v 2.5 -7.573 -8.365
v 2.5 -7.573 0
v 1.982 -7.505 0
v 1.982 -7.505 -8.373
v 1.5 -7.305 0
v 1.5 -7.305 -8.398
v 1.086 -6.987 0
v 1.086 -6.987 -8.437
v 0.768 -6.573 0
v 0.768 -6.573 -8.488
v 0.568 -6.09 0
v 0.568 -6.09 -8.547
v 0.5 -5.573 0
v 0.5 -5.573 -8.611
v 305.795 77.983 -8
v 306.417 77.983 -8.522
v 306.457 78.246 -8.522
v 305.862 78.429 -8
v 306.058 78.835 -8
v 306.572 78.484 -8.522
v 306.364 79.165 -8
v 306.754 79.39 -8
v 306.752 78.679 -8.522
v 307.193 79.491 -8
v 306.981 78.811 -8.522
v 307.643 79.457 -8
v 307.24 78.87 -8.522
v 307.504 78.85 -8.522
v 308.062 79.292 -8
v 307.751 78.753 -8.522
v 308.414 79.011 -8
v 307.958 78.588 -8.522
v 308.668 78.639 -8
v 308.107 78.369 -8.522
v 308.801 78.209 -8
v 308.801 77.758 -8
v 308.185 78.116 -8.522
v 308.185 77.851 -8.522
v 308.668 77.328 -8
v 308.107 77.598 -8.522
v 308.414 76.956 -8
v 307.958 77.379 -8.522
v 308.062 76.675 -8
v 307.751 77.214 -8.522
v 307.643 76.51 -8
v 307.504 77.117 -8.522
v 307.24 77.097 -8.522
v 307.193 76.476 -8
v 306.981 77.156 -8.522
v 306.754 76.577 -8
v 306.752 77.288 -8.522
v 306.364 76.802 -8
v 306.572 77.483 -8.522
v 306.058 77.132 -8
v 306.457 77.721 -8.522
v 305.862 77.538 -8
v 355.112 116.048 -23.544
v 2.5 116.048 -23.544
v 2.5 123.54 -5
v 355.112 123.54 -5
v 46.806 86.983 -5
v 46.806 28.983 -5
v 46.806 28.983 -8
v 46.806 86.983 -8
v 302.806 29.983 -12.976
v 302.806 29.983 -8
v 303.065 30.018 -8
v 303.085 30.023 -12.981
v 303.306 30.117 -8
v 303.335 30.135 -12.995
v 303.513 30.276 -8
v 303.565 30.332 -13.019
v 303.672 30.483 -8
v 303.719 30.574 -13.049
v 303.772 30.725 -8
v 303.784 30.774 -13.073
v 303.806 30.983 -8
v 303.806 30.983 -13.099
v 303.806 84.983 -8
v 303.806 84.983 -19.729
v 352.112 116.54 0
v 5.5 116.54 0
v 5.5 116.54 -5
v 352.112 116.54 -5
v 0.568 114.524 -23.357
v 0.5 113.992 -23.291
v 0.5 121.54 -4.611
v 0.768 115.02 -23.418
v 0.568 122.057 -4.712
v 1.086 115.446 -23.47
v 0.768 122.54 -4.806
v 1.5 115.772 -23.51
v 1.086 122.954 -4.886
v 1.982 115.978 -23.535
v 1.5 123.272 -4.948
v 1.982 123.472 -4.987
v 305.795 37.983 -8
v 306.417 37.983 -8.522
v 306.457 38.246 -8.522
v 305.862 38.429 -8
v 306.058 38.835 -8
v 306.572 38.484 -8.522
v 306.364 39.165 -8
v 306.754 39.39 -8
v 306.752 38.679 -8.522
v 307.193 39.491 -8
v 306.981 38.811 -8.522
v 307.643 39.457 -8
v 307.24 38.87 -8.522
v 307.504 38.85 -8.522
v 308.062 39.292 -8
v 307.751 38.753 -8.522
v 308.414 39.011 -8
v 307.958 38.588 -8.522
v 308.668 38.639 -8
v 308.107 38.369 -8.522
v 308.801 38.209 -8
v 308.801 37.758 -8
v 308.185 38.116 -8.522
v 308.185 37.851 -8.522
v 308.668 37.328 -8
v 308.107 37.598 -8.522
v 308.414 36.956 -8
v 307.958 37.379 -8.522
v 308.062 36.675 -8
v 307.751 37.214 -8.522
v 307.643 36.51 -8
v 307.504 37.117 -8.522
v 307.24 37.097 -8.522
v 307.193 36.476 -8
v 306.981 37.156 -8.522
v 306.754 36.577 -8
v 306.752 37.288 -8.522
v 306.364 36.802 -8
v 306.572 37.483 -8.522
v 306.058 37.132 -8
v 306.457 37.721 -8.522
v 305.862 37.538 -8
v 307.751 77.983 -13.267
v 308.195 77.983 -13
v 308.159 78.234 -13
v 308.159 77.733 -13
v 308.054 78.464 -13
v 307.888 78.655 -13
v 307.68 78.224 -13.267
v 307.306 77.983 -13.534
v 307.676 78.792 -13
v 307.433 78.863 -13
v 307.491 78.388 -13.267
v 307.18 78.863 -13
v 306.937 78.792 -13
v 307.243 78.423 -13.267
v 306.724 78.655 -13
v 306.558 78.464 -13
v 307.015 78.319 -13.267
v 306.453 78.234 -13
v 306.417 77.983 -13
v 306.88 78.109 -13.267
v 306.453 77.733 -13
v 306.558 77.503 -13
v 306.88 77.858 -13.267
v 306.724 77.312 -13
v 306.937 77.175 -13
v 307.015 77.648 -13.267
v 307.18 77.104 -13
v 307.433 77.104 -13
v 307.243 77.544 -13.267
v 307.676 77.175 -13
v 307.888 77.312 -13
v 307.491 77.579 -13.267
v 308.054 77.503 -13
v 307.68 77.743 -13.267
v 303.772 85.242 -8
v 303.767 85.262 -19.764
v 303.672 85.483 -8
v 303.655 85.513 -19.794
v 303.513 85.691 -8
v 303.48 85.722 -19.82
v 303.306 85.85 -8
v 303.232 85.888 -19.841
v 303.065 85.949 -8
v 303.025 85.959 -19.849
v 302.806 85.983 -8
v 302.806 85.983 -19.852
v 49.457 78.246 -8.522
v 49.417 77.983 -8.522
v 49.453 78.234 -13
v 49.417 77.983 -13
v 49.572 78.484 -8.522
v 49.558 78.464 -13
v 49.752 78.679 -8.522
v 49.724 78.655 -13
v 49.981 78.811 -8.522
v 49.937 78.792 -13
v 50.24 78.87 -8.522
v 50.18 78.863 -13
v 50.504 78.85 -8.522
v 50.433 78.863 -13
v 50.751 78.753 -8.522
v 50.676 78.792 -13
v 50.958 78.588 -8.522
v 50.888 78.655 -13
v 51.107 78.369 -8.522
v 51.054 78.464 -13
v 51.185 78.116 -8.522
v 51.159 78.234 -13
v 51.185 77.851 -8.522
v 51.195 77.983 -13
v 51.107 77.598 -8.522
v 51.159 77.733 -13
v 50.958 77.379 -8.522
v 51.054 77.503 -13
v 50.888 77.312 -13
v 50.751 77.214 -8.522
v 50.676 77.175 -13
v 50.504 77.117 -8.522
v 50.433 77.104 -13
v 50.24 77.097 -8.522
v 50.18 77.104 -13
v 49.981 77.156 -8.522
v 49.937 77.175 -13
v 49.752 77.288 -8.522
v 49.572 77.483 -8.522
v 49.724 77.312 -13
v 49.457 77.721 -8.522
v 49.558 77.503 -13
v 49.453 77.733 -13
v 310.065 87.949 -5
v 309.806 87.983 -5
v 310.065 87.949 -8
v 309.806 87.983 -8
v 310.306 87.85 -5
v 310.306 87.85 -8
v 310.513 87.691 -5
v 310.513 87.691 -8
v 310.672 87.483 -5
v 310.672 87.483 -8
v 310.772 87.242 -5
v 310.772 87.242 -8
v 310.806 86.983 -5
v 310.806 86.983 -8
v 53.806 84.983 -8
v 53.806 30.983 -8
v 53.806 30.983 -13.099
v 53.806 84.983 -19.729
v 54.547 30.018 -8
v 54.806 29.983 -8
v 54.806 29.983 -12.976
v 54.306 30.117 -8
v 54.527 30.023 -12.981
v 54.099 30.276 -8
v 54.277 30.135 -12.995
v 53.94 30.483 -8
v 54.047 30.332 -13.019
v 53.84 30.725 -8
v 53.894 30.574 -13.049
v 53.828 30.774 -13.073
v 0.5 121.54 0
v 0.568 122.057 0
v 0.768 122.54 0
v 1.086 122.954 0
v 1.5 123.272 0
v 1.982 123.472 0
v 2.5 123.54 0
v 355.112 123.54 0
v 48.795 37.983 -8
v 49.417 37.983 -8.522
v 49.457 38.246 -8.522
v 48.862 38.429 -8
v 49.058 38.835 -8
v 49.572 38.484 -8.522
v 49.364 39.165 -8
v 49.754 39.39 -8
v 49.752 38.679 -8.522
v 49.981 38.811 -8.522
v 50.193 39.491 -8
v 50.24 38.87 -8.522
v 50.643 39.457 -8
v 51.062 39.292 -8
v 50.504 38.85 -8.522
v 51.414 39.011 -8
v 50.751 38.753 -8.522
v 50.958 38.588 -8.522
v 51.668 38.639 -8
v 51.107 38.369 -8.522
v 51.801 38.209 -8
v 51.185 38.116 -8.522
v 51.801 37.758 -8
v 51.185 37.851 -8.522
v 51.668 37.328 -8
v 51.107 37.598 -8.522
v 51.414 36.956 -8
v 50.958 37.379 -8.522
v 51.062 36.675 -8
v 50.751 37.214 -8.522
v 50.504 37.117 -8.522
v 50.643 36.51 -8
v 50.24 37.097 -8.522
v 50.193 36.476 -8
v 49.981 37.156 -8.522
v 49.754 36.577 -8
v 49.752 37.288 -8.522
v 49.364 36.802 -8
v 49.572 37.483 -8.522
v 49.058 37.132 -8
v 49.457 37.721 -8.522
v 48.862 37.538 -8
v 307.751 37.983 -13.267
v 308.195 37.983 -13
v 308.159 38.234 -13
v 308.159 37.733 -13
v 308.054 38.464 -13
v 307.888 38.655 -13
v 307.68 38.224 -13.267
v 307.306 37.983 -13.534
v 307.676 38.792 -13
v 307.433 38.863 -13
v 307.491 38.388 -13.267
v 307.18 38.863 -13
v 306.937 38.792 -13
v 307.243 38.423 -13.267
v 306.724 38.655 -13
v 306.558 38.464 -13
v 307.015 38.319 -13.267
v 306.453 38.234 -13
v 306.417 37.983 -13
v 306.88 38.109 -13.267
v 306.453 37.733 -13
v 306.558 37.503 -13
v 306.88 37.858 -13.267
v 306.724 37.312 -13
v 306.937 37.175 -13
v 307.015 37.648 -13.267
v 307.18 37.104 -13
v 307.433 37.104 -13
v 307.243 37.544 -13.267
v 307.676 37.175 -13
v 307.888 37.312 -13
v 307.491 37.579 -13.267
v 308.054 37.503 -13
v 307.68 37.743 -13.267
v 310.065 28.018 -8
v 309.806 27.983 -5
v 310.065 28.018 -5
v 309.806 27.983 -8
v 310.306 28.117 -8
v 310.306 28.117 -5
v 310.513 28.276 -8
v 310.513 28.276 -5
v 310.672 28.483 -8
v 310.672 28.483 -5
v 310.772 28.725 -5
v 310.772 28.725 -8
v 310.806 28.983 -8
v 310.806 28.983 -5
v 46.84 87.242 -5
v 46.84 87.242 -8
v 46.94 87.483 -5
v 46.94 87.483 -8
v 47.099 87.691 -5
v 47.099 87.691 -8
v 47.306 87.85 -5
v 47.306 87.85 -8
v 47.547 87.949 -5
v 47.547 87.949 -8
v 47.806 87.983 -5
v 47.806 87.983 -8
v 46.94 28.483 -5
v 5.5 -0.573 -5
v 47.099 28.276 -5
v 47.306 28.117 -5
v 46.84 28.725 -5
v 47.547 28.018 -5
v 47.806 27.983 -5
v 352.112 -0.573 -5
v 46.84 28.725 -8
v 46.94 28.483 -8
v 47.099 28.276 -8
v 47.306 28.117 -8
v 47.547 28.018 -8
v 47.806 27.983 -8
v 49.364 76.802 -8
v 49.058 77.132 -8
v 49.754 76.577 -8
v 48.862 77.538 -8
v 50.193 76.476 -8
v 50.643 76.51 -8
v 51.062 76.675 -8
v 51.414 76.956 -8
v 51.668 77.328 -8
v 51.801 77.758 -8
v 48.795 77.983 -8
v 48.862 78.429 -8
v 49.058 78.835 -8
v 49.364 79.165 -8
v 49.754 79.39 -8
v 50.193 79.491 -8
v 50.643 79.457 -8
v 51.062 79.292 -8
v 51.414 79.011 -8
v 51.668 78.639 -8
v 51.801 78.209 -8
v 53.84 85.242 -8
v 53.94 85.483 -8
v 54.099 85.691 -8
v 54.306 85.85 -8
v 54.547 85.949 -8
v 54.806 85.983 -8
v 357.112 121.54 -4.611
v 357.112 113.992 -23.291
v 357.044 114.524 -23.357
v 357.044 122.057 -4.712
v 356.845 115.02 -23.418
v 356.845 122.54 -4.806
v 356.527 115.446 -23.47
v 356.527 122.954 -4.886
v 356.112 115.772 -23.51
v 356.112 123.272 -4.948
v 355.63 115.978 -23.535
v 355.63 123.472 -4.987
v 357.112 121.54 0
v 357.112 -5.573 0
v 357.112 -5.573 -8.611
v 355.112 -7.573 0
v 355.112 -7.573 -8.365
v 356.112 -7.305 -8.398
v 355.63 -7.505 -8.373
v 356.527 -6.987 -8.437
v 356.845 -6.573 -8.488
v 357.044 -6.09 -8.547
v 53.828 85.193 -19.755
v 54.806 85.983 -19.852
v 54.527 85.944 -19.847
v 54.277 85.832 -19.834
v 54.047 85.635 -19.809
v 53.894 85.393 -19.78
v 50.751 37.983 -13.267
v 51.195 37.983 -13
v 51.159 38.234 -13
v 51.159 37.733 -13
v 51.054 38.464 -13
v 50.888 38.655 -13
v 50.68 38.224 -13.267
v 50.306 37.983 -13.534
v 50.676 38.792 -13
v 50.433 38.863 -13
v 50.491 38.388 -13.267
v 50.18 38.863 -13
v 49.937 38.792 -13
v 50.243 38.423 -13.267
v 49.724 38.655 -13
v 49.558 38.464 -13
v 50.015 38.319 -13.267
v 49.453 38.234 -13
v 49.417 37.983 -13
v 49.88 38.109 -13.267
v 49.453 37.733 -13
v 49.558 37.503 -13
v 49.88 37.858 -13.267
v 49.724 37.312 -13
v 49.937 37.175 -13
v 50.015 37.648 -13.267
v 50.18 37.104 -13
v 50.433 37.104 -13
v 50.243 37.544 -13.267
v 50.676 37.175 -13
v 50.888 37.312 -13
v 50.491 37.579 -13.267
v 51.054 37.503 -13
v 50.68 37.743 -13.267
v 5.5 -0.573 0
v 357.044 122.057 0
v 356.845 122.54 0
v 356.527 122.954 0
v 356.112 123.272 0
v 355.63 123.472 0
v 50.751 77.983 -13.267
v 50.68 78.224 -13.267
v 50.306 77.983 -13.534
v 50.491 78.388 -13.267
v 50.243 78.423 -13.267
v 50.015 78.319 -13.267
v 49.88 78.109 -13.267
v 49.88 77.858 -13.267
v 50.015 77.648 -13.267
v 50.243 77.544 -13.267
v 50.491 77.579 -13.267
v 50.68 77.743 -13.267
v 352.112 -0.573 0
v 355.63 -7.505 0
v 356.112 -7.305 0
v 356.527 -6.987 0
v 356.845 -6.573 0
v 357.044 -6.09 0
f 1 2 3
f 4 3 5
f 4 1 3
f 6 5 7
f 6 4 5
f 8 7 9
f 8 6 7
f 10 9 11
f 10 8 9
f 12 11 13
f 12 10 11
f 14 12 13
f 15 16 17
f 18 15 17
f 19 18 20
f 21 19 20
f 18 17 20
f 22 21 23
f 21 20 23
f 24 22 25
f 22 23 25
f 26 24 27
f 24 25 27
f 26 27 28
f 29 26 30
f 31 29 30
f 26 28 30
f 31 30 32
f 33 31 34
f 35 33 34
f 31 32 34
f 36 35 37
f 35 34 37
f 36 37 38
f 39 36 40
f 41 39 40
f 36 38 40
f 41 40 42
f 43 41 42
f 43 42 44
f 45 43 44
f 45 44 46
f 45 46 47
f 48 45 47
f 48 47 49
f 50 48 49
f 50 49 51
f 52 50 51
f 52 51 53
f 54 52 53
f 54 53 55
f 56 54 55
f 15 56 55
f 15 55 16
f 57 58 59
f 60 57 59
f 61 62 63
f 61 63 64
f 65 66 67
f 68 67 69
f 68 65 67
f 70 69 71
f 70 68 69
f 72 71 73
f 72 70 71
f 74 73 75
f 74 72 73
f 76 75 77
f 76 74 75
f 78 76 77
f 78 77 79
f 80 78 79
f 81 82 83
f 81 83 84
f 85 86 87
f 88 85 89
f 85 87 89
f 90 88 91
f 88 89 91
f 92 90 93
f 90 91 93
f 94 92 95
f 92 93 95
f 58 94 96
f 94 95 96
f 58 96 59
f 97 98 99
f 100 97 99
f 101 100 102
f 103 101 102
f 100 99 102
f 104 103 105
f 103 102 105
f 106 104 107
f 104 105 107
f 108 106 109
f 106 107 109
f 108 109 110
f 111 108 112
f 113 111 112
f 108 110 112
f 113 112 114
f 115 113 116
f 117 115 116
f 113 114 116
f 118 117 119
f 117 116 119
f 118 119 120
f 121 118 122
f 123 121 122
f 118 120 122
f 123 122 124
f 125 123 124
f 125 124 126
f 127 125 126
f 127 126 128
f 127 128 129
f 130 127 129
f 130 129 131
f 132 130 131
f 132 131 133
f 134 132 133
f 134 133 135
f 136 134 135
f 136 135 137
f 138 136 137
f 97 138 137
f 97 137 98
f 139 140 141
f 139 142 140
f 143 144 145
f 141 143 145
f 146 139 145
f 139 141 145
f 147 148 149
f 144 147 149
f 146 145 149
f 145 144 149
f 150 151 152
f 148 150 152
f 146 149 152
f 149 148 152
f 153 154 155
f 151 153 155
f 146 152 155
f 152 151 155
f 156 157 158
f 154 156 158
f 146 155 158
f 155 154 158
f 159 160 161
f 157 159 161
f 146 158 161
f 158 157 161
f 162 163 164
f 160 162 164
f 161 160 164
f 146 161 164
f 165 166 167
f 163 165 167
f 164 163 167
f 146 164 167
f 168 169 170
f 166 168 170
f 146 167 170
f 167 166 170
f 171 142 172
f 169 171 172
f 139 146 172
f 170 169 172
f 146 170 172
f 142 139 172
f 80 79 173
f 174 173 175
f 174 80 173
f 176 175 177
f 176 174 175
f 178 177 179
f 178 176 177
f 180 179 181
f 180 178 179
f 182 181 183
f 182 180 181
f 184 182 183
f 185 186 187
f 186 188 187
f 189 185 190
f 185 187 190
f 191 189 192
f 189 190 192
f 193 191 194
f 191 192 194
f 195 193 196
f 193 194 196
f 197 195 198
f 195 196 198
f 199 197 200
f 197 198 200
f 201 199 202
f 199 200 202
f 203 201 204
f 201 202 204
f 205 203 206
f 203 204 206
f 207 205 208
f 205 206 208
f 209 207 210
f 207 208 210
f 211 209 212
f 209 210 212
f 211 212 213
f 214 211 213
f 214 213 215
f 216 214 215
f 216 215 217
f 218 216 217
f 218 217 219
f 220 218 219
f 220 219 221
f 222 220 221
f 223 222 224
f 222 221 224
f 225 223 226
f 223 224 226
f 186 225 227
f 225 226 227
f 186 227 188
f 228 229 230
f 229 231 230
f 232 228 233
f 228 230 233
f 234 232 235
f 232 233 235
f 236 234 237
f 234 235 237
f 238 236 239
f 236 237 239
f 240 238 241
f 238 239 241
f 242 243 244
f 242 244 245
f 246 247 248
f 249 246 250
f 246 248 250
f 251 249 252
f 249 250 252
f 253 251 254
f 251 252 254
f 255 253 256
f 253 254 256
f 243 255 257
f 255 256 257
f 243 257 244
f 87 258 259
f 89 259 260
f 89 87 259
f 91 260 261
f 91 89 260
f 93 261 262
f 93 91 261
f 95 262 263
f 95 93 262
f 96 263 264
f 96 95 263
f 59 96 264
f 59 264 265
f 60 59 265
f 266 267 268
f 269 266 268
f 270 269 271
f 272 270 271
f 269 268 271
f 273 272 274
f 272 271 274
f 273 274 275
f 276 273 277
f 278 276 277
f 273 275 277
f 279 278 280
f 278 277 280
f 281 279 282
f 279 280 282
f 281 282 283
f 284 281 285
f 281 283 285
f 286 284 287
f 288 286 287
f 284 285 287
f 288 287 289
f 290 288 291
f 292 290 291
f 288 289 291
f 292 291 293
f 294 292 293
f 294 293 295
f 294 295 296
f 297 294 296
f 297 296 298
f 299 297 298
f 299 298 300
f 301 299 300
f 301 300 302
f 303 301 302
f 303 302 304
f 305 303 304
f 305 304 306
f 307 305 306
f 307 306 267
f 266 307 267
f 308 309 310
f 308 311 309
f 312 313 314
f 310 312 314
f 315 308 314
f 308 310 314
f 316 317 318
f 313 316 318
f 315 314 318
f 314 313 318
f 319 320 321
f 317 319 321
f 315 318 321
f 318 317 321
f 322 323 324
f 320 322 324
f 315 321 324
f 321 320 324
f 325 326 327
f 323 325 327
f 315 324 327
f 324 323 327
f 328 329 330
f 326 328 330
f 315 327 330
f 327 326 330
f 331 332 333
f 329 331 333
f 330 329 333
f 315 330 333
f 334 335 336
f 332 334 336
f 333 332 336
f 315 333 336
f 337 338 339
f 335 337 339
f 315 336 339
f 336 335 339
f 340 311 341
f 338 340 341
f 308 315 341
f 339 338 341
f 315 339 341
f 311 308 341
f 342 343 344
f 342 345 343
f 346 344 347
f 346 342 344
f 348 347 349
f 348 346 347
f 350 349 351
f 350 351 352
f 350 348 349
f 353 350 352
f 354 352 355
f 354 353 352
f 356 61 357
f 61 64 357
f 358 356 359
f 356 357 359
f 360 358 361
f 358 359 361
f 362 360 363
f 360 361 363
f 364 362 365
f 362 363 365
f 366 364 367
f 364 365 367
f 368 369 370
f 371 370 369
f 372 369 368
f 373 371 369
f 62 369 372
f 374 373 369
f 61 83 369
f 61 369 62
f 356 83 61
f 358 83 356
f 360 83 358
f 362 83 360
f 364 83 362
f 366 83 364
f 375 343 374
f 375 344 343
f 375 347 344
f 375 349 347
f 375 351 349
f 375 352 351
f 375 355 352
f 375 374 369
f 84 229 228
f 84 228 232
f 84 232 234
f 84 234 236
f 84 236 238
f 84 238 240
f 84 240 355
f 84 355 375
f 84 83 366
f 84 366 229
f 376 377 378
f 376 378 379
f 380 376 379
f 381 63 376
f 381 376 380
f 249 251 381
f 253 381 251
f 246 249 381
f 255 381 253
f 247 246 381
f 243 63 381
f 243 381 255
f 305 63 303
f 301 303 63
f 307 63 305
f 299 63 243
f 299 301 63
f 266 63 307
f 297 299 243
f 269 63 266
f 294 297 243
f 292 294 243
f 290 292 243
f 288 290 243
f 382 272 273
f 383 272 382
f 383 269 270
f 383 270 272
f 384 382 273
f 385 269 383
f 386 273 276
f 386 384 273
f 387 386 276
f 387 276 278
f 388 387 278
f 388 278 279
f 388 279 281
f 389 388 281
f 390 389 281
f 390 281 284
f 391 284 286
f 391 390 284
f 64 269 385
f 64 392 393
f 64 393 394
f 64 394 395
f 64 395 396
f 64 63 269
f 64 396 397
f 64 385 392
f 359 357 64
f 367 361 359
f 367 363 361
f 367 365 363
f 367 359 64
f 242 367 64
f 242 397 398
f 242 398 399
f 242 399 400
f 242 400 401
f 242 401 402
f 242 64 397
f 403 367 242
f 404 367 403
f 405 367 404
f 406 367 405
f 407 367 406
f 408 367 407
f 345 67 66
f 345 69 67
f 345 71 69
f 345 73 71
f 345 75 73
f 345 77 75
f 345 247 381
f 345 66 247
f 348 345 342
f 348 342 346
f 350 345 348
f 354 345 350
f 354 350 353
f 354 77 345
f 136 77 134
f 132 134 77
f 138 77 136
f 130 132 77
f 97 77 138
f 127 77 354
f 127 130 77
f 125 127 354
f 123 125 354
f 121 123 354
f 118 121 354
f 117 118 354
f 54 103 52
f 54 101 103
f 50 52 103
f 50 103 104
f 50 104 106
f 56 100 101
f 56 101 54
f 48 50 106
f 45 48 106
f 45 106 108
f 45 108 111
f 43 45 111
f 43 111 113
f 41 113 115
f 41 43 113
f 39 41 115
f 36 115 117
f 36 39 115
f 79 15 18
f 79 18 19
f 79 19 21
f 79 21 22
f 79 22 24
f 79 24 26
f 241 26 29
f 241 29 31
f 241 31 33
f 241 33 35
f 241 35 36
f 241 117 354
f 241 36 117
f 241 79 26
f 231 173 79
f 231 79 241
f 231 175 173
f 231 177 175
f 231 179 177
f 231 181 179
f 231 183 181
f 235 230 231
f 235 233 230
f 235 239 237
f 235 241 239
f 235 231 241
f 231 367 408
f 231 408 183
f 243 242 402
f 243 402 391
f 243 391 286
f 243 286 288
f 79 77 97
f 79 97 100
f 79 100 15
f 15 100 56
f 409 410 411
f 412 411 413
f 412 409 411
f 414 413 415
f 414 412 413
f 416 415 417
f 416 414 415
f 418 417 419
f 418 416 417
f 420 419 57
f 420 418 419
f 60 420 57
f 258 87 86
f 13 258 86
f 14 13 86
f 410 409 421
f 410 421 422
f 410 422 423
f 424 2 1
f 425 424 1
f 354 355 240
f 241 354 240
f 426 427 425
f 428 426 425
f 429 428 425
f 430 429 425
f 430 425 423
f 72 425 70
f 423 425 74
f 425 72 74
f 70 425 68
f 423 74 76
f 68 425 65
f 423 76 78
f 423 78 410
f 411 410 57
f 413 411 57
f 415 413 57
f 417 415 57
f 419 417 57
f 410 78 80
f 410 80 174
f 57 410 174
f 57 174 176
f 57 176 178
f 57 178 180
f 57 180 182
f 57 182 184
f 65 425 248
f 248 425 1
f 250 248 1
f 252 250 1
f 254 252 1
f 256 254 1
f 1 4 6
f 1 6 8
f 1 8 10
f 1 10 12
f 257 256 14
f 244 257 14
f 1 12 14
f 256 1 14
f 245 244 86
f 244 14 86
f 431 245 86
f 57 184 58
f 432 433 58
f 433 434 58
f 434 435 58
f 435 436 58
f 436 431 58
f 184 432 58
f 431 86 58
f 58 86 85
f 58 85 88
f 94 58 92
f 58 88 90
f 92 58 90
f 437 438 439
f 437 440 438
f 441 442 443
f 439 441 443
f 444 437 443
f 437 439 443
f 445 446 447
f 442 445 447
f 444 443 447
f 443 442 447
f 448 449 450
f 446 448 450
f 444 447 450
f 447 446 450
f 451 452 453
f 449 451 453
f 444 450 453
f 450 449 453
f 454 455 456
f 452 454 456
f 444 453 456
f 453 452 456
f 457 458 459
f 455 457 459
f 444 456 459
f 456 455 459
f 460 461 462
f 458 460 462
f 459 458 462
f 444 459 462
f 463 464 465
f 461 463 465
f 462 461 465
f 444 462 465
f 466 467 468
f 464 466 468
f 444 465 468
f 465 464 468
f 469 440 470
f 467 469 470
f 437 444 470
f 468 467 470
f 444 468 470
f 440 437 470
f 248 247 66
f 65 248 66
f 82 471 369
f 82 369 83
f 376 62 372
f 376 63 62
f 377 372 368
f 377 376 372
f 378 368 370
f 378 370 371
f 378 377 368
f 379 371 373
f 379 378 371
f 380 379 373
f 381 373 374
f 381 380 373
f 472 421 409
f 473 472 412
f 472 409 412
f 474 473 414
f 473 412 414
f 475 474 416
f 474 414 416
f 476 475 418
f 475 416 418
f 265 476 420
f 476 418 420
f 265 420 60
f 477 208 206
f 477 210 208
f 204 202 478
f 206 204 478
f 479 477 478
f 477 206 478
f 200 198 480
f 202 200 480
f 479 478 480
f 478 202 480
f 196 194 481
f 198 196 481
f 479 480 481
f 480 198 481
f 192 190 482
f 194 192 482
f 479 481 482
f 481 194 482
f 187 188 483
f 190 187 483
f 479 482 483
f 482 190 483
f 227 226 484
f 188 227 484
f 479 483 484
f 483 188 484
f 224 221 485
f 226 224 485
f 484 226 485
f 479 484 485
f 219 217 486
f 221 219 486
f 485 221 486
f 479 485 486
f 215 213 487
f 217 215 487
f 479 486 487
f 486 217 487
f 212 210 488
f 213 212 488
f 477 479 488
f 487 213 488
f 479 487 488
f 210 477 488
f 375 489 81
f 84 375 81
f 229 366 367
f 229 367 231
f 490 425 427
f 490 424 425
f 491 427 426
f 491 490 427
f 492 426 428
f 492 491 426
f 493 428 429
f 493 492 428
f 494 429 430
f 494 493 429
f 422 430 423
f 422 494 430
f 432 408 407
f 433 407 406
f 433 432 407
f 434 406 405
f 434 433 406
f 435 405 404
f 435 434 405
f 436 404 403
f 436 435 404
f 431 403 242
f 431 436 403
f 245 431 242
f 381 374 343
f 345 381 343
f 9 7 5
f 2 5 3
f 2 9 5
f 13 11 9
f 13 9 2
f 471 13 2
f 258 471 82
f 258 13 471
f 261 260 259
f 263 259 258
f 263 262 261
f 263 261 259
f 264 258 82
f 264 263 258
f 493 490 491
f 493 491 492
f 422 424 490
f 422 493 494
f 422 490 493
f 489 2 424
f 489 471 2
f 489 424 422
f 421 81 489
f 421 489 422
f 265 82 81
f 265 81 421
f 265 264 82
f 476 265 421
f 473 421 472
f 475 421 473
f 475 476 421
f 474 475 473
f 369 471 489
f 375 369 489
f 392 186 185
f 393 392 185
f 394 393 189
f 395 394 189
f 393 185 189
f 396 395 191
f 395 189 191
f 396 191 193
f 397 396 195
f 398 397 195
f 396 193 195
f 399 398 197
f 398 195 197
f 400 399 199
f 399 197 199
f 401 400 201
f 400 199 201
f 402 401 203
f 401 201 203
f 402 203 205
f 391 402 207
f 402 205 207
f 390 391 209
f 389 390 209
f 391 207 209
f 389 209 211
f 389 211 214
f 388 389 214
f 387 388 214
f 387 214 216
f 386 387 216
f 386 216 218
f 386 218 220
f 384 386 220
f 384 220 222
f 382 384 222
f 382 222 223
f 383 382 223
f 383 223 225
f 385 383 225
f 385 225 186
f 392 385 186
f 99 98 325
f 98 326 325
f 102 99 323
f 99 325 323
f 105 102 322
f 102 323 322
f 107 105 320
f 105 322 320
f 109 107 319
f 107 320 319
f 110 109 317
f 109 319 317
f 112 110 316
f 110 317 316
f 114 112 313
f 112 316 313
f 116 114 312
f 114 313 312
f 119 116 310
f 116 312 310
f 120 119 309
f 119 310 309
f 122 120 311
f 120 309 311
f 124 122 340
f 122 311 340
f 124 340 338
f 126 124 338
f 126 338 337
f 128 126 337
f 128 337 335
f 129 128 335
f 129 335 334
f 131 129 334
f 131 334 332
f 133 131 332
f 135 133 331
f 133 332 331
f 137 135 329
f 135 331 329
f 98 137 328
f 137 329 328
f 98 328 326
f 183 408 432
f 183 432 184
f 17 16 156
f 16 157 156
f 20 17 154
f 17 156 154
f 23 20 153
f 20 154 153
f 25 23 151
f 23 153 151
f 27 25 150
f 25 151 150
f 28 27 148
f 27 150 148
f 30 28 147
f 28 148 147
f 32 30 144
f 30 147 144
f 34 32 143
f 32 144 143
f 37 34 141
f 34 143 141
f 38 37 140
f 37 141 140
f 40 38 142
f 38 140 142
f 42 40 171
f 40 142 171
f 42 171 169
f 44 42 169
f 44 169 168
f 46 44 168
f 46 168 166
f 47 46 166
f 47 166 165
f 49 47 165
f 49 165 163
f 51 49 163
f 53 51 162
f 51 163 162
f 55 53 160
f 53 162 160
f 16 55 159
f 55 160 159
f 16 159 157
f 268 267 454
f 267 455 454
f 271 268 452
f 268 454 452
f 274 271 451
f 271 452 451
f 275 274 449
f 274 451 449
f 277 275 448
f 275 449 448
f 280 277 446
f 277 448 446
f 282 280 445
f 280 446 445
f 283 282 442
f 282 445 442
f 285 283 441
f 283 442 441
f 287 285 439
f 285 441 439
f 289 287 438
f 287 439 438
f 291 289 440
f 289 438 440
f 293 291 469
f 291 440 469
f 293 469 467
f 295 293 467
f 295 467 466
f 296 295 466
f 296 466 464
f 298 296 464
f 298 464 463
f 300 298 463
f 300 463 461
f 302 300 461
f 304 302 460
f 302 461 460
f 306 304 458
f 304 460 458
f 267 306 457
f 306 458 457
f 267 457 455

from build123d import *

# Parameters (mm, degrees)
SKETCH3_W                                         = 356.6125
SKETCH3_H                                         = 131.1125
BOSS_EXTRUDE1_DEPTH                               = 5
BOSS_EXTRUDE2_DEPTH                               = 356.6125
SKETCH5_W                                         = 346.6125
SKETCH5_H                                         = 117.1125
CUT_EXTRUDE1_DEPTH                                = 5
SKETCH6_W                                         = 264
SKETCH6_H                                         = 60
CUT_EXTRUDE2_DEPTH                                = 3
SKETCH7_W                                         = 250
SKETCH7_H                                         = 56
CUT_EXTRUDE3_DEPTH                                = 43
FILLET1_R                                         = 1
CSK_FOR_0_FLAT_HEAD_MACHINE_SCREW_100_D           = 1.778
CSK_FOR_0_FLAT_HEAD_MACHINE_SCREW_100_DEPTH       = 5
CSK_FOR_0_FLAT_HEAD_MACHINE_SCREW_100_CSINK_D     = 3.0226
CSK_FOR_0_FLAT_HEAD_MACHINE_SCREW_100_CSINK_ANGLE = 100
CSK_FOR_0_FLAT_HEAD_MACHINE_SCREW_100_TIP         = 0.53416509
CSK_FOR_0_FLAT_HEAD_MACHINE_SCREW_2_D             = 1.778
CSK_FOR_0_FLAT_HEAD_MACHINE_SCREW_2_DEPTH         = 5
CSK_FOR_0_FLAT_HEAD_MACHINE_SCREW_2_CSINK_D       = 3.0226
CSK_FOR_0_FLAT_HEAD_MACHINE_SCREW_2_CSINK_ANGLE   = 100
CSK_FOR_0_FLAT_HEAD_MACHINE_SCREW_2_TIP           = 0.53416509
FILLET2_R                                         = 2


with BuildPart() as part:
    # Sketch3 → Boss-Extrude1 (new body)
    with BuildSketch(Plane.XY):
        with Locations((178.80625, 57.983485256)):
            Rectangle(SKETCH3_W, SKETCH3_H)
    extrude(amount=-BOSS_EXTRUDE1_DEPTH)

    # Sketch4 → Boss-Extrude2 (add)
    with BuildSketch(Plane.ZY.offset(-0.5)):
        Polygon((-5, -7.572764744), (-8.365004472, -7.572764744), (-23.543677091, 116.047603388), (-5, 123.539735256), align=None)
    extrude(amount=-BOSS_EXTRUDE2_DEPTH)

    # Sketch5 → Cut-Extrude1 (cut)
    with BuildSketch(Plane.XY):
        with Locations((178.80625, 57.983485256)):
            Rectangle(SKETCH5_W, SKETCH5_H)
    extrude(amount=-CUT_EXTRUDE1_DEPTH, mode=Mode.SUBTRACT)

    # Sketch6 → Cut-Extrude2 (cut)
    with BuildSketch(Plane.XY.offset(-5)):
        with Locations((178.80625, 57.983485256)):
            Rectangle(SKETCH6_W, SKETCH6_H)
    extrude(amount=-CUT_EXTRUDE2_DEPTH, mode=Mode.SUBTRACT)

    # Sketch7 → Cut-Extrude3 (cut)
    with BuildSketch(Plane.XY.offset(-8)):
        with Locations((178.80625, 57.983485256)):
            Rectangle(SKETCH7_W, SKETCH7_H)
    extrude(amount=-CUT_EXTRUDE3_DEPTH, mode=Mode.SUBTRACT)

    # Fillet1
    fillet1_edges = [part.edges().sort_by_distance(p)[0] for p in [
        (46.80625, 27.983485256, -6.5),
        (46.80625, 87.983485256, -6.5),
        (310.80625, 87.983485256, -6.5),
        (310.80625, 27.983485256, -6.5),
        (53.80625, 29.983485256, -10.488166069),
        (53.80625, 85.983485256, -13.926133774),
        (303.80625, 85.983485256, -13.926133774),
        (303.80625, 29.983485256, -10.488166069),
    ]]
    fillet(fillet1_edges, radius=FILLET1_R)

    # CSK for _0 Flat Head Machine Screw _100
    with Locations(Plane.XY.offset(-8)):
        with Locations((50.30625, 77.983485256), (50.30625, 37.983485256)):
            CounterSinkHole(CSK_FOR_0_FLAT_HEAD_MACHINE_SCREW_100_D / 2, CSK_FOR_0_FLAT_HEAD_MACHINE_SCREW_100_CSINK_D / 2, depth=CSK_FOR_0_FLAT_HEAD_MACHINE_SCREW_100_DEPTH, counter_sink_angle=CSK_FOR_0_FLAT_HEAD_MACHINE_SCREW_100_CSINK_ANGLE)
            with Locations((0, 0, -(CSK_FOR_0_FLAT_HEAD_MACHINE_SCREW_100_DEPTH + CSK_FOR_0_FLAT_HEAD_MACHINE_SCREW_100_TIP / 2))):  # 118° drill point
                Cone(0, CSK_FOR_0_FLAT_HEAD_MACHINE_SCREW_100_D / 2, CSK_FOR_0_FLAT_HEAD_MACHINE_SCREW_100_TIP, mode=Mode.SUBTRACT)

    # CSK for _0 Flat Head Machine Screw _ 2
    with Locations(Plane.XY.offset(-8)):
        with Locations((307.30625, 77.983485256), (307.30625, 37.983485256)):
            CounterSinkHole(CSK_FOR_0_FLAT_HEAD_MACHINE_SCREW_2_D / 2, CSK_FOR_0_FLAT_HEAD_MACHINE_SCREW_2_CSINK_D / 2, depth=CSK_FOR_0_FLAT_HEAD_MACHINE_SCREW_2_DEPTH, counter_sink_angle=CSK_FOR_0_FLAT_HEAD_MACHINE_SCREW_2_CSINK_ANGLE)
            with Locations((0, 0, -(CSK_FOR_0_FLAT_HEAD_MACHINE_SCREW_2_DEPTH + CSK_FOR_0_FLAT_HEAD_MACHINE_SCREW_2_TIP / 2))):  # 118° drill point
                Cone(0, CSK_FOR_0_FLAT_HEAD_MACHINE_SCREW_2_D / 2, CSK_FOR_0_FLAT_HEAD_MACHINE_SCREW_2_TIP, mode=Mode.SUBTRACT)

    # Fillet2
    fillet2_edges = [part.edges().sort_by_distance(p)[0] for p in [
        (0.5, 119.793669322, -14.271838546),
        (357.1125, 119.793669322, -14.271838546),
        (357.1125, -7.572764744, -4.182502236),
        (0.5, -7.572764744, -4.182502236),
        (0.5, 123.539735256, -2.5),
        (357.1125, 123.539735256, -2.5),
    ]]
    fillet(fillet2_edges, radius=FILLET2_R)


solid = part.part
